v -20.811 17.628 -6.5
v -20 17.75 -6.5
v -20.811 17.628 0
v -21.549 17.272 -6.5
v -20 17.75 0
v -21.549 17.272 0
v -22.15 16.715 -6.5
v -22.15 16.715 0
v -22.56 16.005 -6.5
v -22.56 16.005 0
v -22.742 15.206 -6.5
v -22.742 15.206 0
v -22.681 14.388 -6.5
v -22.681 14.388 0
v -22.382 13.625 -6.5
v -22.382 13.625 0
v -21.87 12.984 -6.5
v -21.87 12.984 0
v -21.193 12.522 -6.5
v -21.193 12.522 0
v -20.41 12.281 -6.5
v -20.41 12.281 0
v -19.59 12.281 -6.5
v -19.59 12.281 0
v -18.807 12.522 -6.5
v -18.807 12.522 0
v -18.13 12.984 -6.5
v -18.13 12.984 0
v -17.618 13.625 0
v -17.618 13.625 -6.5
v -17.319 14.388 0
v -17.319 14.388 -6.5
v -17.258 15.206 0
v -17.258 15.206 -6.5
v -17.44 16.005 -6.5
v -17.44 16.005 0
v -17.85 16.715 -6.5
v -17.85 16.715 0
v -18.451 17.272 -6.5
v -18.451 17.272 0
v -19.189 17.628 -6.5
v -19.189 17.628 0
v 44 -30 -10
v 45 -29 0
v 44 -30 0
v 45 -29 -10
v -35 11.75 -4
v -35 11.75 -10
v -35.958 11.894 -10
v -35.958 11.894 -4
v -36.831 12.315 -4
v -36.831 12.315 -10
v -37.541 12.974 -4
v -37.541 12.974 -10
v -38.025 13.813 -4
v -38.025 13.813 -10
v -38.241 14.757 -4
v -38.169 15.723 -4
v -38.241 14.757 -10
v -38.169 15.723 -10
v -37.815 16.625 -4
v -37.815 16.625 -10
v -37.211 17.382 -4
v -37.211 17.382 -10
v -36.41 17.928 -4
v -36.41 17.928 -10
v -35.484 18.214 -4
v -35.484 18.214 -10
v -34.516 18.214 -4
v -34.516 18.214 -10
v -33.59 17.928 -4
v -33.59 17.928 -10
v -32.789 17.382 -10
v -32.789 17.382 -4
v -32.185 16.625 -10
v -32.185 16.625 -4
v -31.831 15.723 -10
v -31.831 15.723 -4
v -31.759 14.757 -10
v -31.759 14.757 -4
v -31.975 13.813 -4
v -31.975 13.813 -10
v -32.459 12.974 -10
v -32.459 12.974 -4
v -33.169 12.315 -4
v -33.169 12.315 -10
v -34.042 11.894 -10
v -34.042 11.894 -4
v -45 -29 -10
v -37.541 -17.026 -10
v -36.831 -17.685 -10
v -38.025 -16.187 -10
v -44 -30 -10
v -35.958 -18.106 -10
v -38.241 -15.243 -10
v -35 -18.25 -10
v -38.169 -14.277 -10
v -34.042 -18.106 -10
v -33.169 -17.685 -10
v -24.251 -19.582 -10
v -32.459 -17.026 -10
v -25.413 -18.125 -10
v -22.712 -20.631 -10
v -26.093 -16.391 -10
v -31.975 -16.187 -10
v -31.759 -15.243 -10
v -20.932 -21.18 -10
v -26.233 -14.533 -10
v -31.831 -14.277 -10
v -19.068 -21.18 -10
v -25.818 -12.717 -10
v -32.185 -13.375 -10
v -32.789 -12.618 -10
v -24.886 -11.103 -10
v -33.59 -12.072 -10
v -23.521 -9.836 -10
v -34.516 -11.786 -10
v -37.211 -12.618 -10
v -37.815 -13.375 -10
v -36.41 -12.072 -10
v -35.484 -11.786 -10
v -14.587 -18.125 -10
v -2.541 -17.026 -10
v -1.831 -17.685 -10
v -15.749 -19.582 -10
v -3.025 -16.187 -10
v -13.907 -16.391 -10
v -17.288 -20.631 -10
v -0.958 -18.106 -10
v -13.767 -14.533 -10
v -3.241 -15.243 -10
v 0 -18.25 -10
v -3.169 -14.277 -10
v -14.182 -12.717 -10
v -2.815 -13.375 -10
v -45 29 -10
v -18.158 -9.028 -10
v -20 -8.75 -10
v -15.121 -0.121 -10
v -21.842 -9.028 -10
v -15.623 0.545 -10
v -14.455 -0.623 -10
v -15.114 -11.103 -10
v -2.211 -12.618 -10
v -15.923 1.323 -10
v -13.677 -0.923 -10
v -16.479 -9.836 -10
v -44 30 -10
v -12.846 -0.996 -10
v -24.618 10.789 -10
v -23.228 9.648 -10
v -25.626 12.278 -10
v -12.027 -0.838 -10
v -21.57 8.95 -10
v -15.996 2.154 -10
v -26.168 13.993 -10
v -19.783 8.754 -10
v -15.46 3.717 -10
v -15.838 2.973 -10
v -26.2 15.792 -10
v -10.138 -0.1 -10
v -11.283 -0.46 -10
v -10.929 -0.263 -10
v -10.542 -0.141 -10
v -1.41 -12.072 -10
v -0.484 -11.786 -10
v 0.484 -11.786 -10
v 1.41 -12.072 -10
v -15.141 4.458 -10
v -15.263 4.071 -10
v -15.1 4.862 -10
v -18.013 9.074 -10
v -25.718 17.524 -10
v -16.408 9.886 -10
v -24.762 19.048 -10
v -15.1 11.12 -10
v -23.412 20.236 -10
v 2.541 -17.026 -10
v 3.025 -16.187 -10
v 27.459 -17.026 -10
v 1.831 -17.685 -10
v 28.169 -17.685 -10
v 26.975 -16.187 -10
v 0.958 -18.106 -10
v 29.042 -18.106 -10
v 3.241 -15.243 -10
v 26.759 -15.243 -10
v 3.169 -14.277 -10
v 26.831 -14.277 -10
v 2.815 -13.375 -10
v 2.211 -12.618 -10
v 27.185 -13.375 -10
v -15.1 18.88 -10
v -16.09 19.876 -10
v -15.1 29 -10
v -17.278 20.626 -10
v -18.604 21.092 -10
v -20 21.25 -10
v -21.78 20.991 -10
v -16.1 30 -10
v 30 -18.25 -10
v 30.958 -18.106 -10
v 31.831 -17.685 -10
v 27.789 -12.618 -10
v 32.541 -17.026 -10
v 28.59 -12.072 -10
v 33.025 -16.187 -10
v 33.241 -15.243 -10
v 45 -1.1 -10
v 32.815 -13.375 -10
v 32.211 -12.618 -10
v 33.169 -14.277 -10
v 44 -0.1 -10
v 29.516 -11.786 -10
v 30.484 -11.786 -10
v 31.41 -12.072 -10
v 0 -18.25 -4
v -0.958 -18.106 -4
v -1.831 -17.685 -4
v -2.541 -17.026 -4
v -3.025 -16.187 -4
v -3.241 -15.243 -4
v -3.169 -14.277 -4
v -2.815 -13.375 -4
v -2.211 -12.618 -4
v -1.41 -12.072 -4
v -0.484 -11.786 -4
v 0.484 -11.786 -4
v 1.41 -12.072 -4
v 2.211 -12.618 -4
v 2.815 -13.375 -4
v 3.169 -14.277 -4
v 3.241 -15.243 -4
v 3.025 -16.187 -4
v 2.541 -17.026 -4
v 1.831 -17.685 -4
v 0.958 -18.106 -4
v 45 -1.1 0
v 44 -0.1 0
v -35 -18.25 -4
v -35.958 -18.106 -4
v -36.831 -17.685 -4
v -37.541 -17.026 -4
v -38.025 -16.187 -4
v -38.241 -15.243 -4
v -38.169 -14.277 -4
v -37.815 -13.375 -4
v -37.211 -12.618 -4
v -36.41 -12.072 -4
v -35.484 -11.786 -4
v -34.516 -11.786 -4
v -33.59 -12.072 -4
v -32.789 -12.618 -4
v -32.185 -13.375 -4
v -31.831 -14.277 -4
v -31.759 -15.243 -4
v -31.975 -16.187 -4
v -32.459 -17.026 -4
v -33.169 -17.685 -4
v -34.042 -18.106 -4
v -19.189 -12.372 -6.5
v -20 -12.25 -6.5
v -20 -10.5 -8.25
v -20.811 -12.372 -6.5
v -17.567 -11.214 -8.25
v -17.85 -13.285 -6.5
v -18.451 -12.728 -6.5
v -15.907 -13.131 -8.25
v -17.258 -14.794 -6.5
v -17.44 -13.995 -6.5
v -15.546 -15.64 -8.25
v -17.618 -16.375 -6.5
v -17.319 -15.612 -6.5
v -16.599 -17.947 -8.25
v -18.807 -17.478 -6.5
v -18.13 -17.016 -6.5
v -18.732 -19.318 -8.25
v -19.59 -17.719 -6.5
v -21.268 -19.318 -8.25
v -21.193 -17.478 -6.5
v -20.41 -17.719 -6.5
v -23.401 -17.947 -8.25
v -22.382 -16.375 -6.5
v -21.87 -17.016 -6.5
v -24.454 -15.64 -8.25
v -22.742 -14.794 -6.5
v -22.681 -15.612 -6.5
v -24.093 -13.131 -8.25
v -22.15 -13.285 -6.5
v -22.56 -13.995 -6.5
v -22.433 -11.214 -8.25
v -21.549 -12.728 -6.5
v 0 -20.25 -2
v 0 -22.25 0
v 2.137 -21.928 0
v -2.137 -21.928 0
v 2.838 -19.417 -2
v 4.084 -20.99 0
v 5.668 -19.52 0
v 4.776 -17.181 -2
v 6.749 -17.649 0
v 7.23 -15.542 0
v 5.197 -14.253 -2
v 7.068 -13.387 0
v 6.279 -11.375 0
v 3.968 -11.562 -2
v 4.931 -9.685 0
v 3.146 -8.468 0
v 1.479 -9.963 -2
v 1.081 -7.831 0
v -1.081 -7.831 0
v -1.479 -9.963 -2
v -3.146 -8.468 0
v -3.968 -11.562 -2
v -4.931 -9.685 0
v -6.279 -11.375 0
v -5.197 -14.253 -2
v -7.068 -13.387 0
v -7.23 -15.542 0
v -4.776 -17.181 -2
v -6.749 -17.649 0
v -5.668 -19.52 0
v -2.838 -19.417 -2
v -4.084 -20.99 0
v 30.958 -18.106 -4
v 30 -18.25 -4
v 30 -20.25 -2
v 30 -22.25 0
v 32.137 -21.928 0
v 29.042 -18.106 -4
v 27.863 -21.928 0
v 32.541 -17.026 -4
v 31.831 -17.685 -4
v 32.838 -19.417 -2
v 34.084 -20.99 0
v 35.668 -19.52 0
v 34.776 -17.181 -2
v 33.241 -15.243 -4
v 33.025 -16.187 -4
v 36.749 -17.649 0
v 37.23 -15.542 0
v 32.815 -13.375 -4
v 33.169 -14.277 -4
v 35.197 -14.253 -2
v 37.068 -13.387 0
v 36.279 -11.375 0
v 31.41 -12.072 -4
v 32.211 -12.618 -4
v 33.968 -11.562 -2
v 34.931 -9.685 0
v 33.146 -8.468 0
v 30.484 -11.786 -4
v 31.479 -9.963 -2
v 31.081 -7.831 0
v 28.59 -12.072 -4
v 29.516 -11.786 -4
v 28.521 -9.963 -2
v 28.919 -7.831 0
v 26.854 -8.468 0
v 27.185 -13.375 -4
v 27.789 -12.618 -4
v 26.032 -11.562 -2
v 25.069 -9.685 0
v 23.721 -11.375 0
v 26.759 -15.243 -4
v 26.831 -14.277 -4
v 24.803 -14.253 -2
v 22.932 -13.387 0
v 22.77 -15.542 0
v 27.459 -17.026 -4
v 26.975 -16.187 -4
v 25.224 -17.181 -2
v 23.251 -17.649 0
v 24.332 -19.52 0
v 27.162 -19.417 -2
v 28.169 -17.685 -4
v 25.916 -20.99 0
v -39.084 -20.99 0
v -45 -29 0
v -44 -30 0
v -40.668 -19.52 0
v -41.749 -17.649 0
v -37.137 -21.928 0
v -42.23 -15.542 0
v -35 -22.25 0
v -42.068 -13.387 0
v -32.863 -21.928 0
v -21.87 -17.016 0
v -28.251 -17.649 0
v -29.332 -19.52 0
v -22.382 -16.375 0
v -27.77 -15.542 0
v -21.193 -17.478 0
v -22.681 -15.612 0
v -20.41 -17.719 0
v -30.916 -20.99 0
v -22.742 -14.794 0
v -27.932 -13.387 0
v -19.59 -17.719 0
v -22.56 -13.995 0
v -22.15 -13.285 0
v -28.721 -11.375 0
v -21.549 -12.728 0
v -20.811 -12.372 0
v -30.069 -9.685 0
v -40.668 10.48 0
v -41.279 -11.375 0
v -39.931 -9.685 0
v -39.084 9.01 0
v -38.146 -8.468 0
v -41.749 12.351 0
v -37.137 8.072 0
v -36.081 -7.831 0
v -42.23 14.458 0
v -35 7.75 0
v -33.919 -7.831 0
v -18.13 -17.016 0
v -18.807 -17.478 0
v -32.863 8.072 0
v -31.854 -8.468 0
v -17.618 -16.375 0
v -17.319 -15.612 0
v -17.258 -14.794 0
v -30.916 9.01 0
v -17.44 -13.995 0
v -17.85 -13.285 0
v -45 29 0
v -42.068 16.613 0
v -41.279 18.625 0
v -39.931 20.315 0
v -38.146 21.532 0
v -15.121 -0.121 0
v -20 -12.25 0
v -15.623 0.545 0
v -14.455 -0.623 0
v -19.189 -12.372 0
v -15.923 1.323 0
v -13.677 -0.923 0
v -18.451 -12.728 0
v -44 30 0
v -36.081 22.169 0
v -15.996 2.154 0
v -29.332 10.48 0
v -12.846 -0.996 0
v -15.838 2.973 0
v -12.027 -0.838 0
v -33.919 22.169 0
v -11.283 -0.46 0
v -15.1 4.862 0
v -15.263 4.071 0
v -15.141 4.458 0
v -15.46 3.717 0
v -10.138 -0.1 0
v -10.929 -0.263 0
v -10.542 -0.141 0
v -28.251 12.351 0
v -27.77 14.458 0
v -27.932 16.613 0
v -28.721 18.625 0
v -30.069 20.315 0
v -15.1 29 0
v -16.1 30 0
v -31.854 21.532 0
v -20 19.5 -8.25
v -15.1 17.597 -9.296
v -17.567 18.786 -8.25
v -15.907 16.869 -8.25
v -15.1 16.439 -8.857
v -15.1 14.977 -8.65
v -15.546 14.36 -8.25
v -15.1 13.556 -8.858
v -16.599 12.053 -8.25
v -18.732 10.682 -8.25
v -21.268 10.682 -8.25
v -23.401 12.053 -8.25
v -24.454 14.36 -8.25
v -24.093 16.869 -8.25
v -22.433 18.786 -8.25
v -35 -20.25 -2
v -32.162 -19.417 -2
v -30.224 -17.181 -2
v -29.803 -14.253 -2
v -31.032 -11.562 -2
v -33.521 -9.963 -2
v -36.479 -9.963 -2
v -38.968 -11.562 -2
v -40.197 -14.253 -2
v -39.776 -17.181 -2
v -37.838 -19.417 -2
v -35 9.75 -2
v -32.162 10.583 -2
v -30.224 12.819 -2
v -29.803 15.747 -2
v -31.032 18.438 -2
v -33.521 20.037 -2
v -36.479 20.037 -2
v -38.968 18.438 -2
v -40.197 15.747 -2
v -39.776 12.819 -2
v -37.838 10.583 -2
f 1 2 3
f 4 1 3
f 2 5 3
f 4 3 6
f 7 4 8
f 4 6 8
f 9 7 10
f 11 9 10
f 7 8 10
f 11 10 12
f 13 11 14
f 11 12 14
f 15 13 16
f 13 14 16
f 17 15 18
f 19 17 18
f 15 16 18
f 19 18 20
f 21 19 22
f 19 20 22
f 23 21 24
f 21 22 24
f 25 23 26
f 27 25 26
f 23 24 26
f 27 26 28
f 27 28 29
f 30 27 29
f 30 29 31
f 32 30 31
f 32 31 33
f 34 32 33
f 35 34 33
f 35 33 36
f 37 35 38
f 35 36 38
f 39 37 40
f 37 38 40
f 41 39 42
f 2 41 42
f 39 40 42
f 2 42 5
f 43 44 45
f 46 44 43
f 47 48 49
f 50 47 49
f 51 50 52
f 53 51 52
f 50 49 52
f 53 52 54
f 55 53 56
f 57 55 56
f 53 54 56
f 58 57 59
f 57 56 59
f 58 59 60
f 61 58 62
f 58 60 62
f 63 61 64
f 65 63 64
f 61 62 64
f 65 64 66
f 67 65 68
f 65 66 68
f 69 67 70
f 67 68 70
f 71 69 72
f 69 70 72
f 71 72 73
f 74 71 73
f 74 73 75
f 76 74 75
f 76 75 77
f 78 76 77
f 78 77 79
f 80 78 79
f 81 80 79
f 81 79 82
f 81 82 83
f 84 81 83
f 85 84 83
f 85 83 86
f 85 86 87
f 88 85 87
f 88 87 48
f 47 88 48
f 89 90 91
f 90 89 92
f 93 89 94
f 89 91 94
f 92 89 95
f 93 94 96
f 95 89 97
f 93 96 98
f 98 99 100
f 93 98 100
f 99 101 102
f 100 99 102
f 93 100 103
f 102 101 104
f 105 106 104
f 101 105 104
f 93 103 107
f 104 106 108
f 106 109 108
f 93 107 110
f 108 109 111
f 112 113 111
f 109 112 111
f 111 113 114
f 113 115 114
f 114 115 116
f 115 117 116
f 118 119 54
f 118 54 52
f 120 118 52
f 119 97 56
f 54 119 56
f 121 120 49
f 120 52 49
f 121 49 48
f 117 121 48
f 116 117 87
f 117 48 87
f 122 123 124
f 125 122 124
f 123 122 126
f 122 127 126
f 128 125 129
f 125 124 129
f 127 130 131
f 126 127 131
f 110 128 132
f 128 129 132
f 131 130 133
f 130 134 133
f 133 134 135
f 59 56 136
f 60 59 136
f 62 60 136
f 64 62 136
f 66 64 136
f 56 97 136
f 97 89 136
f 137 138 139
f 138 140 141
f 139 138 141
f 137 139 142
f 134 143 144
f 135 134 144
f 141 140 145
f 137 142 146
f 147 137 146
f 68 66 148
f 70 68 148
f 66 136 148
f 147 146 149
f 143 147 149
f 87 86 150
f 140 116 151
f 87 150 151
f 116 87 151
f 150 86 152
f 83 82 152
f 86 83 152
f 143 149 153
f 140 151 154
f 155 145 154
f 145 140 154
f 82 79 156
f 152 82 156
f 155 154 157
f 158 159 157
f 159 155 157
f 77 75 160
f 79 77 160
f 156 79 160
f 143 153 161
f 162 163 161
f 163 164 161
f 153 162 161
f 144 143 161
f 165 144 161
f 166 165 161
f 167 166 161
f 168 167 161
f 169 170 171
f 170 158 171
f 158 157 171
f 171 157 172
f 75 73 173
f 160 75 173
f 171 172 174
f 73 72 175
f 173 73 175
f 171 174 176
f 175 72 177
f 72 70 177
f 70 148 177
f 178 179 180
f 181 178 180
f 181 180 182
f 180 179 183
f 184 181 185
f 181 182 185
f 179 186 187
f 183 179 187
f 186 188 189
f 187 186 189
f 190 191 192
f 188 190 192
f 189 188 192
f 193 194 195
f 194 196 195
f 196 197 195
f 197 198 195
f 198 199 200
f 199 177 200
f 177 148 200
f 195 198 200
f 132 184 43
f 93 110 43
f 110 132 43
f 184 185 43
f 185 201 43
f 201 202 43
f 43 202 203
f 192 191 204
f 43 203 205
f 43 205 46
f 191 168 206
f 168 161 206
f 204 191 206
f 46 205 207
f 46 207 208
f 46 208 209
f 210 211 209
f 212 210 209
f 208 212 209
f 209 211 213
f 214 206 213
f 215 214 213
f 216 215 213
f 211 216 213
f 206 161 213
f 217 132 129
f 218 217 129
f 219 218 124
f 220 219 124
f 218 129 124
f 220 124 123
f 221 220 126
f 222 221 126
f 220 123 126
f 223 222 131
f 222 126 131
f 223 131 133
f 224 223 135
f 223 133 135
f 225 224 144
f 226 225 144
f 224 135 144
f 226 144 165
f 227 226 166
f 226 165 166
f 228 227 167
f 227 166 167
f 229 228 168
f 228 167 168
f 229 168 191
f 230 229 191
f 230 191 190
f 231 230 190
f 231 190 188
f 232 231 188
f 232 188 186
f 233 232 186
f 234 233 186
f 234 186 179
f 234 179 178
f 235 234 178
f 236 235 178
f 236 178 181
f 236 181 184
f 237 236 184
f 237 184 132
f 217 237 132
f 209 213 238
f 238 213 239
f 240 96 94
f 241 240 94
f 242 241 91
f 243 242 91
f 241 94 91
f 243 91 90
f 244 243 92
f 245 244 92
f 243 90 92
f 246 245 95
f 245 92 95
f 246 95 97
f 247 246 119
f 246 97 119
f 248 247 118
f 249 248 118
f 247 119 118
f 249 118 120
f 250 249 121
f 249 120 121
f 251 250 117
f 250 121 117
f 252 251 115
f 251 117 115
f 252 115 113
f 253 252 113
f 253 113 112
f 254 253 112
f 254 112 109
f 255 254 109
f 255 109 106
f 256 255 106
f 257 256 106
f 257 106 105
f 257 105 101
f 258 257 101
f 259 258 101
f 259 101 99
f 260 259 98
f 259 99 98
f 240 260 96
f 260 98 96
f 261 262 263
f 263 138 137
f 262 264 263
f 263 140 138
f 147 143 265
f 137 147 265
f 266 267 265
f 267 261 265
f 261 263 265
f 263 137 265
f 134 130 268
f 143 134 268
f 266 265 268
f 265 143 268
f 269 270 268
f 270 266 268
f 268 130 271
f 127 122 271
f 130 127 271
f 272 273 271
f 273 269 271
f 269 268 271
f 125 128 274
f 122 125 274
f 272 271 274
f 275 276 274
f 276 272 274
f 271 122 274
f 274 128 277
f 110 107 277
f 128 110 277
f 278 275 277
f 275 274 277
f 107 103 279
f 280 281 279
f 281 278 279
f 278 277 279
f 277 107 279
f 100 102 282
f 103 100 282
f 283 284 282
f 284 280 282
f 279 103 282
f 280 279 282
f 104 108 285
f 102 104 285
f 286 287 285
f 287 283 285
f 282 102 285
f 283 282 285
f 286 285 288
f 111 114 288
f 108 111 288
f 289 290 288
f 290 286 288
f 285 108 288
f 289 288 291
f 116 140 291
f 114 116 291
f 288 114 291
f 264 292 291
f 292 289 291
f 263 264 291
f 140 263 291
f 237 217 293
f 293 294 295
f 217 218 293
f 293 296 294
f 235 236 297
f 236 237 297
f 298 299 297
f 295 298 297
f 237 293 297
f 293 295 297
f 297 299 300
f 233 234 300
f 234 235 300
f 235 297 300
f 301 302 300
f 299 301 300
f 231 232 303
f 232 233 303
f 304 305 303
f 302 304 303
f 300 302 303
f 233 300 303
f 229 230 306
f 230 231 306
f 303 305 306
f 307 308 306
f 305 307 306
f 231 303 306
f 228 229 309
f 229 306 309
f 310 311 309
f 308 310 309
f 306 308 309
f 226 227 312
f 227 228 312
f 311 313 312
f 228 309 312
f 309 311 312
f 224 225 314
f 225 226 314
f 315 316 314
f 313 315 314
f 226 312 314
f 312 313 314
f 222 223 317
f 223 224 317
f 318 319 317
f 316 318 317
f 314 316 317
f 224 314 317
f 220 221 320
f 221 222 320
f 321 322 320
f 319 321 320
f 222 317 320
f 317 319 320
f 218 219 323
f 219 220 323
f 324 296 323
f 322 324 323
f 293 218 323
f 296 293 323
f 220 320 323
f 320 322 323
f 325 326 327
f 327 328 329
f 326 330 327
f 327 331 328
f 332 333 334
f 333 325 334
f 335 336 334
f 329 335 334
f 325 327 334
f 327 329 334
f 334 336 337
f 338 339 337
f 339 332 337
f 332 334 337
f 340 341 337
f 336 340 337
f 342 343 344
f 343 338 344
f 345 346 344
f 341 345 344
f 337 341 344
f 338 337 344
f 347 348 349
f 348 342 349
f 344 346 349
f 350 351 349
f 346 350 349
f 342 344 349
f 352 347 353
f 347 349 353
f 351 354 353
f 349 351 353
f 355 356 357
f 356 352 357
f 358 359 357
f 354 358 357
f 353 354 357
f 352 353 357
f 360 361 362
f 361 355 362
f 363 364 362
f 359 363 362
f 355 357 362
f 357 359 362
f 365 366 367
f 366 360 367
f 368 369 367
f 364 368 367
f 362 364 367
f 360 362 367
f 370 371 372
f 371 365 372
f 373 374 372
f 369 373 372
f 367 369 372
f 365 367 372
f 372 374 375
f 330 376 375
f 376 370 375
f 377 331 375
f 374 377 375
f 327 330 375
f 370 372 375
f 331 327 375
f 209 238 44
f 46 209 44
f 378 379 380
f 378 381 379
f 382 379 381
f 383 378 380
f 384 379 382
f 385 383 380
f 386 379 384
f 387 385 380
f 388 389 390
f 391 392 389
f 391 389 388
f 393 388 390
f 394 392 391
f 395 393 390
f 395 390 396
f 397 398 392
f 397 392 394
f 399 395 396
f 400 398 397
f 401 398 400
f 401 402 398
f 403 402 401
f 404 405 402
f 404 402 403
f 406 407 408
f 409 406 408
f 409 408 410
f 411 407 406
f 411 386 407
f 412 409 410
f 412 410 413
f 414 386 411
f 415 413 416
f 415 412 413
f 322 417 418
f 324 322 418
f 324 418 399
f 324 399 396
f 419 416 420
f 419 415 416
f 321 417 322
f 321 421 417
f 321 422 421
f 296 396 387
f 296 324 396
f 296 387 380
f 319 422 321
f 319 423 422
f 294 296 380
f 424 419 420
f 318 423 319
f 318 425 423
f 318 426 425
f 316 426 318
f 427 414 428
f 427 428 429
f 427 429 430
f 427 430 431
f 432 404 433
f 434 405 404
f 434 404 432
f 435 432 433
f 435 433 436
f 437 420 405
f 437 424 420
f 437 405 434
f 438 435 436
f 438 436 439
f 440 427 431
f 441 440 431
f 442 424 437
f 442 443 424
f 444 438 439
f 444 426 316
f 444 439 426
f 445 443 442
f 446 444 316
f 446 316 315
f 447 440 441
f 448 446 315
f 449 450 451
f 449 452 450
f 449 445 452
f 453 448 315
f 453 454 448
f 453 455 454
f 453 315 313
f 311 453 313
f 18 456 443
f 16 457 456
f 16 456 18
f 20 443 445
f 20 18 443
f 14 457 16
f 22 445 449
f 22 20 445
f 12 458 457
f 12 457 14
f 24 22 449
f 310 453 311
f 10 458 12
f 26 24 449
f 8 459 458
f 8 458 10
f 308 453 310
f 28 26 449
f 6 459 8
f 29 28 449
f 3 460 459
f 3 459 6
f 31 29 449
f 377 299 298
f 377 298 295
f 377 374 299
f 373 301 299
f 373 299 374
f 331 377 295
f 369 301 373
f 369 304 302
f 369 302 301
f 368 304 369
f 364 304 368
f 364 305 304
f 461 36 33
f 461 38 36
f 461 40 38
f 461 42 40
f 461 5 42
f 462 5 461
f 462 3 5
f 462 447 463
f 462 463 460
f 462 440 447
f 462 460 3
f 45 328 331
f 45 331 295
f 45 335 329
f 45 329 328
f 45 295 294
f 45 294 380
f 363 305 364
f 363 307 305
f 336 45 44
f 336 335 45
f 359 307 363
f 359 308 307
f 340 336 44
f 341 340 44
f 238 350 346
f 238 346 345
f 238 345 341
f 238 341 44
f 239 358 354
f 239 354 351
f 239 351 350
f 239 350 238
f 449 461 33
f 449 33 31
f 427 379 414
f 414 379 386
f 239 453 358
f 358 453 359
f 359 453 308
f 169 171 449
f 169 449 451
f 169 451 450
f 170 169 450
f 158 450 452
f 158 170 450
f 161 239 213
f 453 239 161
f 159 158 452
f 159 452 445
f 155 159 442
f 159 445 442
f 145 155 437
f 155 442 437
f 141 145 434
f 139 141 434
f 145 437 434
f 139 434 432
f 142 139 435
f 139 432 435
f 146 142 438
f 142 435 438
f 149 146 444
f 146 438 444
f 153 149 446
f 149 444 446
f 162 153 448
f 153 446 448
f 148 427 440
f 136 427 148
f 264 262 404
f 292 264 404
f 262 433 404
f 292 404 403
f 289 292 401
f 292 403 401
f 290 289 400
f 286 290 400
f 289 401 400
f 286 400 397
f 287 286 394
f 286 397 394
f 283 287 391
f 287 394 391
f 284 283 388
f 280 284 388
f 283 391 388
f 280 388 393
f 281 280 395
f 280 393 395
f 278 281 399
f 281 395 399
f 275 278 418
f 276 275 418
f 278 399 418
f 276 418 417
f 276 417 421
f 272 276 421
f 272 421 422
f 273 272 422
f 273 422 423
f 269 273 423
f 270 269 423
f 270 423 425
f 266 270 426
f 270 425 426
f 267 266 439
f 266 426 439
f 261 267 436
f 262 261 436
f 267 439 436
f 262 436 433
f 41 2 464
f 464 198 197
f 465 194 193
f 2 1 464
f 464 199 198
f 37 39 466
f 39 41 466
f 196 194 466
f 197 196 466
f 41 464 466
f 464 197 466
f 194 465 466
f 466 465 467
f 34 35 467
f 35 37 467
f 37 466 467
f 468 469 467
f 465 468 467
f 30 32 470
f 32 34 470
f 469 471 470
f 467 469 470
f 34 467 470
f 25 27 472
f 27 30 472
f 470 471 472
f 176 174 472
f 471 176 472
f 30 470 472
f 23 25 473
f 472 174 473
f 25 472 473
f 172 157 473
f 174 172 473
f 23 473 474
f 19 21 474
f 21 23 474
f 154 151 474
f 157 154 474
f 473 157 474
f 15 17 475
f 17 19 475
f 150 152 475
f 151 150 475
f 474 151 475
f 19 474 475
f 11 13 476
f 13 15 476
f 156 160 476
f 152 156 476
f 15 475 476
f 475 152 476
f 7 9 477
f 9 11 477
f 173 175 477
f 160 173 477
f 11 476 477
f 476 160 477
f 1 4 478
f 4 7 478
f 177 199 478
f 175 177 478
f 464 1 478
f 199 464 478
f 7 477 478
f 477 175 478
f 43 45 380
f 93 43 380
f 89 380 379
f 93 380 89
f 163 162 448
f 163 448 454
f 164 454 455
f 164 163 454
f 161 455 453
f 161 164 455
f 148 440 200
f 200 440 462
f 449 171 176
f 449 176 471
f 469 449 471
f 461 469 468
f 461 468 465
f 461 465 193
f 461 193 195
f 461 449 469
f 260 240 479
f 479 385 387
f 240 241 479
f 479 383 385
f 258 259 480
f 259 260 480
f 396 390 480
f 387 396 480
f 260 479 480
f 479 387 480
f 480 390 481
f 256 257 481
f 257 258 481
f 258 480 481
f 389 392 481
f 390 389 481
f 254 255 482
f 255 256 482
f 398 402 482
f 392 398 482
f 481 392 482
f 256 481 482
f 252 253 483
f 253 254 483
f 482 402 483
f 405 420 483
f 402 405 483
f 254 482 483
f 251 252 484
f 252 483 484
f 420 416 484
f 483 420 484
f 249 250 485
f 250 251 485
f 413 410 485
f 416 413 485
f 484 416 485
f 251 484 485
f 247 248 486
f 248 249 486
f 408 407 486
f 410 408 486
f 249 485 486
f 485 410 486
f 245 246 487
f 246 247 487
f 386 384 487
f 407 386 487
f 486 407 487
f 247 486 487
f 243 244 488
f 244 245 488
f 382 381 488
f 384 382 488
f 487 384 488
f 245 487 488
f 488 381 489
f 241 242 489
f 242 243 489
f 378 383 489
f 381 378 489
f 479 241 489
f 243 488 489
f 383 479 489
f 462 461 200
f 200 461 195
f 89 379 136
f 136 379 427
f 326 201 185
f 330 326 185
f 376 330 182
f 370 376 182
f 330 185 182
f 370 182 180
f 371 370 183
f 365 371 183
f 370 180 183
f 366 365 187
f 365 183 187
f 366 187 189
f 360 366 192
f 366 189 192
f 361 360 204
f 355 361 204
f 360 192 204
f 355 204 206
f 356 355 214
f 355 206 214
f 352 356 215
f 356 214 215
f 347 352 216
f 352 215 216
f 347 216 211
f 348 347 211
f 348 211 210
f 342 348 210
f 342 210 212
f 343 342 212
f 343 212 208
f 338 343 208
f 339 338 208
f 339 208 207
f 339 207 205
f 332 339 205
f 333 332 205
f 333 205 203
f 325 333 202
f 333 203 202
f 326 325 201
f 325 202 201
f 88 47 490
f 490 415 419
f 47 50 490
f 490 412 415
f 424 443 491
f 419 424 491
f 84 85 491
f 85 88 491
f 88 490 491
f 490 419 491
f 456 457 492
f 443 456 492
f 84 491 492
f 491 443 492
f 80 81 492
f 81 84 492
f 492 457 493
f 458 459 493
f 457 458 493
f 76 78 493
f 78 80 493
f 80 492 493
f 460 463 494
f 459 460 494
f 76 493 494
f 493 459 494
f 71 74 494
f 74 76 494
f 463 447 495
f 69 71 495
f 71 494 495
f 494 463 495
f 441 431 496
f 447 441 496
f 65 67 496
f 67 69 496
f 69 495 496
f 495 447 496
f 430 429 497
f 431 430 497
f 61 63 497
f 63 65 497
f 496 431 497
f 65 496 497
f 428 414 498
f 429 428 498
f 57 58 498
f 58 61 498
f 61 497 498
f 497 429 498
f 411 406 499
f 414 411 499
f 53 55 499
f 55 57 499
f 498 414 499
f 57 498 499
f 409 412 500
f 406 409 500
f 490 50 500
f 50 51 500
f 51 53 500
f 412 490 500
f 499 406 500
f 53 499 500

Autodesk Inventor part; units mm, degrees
ref_plane "YZ Plane" through (0, 0, 0) normal (1, 0, 0) x (0, 1, 0)
ref_plane "XZ Plane" through (0, 0, 0) normal (0, 1, 0) x (-1, 0, 0)
ref_plane "XY Plane" through (0, 0, 0) normal (0, 0, 1) x (1, 0, 0)
sketch "Esboço1" plane through (0, 0, 0) normal (0, 0, 1) x (1, 0, 0)
  line L0 (-63.02, 0) -> (63.12, 0) construction
  line L1 (0, -42.02) -> (0, 42.12) construction
  line L2 (-45, 30) -> (45, 30)
  line L3 (45, 30) -> (45, -30)
  line L4 (45, -30) -> (-45, -30)
  line L5 (-45, -30) -> (-45, 30)
  line L6 (-15, 30) -> (45, 30) construction
  line L7 (45, 30) -> (45, 0) construction
  line L8 (45, 0) -> (-15, 0) construction
  line L9 (-15, 0) -> (-15, 30) construction
  line L10 (-15.1, 30.1) -> (45.1, 30.1)
  line L11 (45.1, 30.1) -> (45.1, -0.1)
  line L12 (45.1, -0.1) -> (-15.1, -0.1)
  line L13 (-15.1, -0.1) -> (-15.1, 30.1)
  line L14 (-25, 30) -> (-15, 30) construction
  line L15 (-15, 30) -> (-15, -30) construction
  line L16 (-15, -30) -> (-25, -30) construction
  line L17 (-25, -30) -> (-25, 30) construction
  line L18 (-45, 15) -> (45, 15) construction
  line L19 (-45, -15) -> (45, -15) construction
  line L20 (-20, -30) -> (-20, 30) construction
  line L21 (-35, 30) -> (-35, -30) construction
  line L22 (15, 30) -> (15, -30) construction
  circle A0 centre (-13, 2) radius 3
  point P0 (0, 0)
  point P1 (-20, 15)
  point P2 (-20, -15)
  point P3 (0, -15)
  point P4 (30, -15)
  point P5 (-35, 15)
  point P6 (-35, -15)
  point P7 (45, -0.1)
  point P8 (-15.1, 30)
  point P9 (-10.8576, -0.1)
  point P10 (-15.1, 4.1424)
  dimension "d0" = 60
  dimension "d1" = 90
  dimension "d2" = 60
  dimension "d3" = 30
  dimension "d4" = 0.1
  dimension "d5" = 10
  dimension "d6" = 30
  dimension "d7" = 30
  dimension "d17" = 6
  dimension "d18" = 2
  dimension "d19" = 2
extrude "Extrusão1" add sketch "Esboço1" against normal blind 10 contours L2 L13 A0 L12 L3 L4 L5 | L2 L3 L12 A0 L13 | A0 L12 L13 | L13 L12 A0
extrude "Extrusão2" cut sketch "Esboço1" against normal through all contours L2 L3 L12 A0 L13 | A0 L12 L13 | L13 L12 A0
hole "Furo1" at (0, -15, 0) at (30, -15, 0) at (-35, 15, 0) at (-35, -15, 0) direction (0, 0, -1) diameter 6.5 end through all countersink diameter 14.5 countersink angle 90 clearance for "Countersunk Flat Head Hex Socket Screw ISO 10642" size "M6" standard "ISO"
sketch "Esboço2" plane through (0, 0, -10) normal (0, 0, -1) x (-1, 0, 0)
  point P0 (0, 0)
  point P1 (20, 15)
  point P2 (20, -15)
hole "Furo2" at (-20, 15, -10) at (-20, -15, -10) direction (0, 0, 1) diameter 5.5 end through all countersink diameter 12.5 countersink angle 90 clearance for "Countersunk Flat Head Hex Socket Screw ISO 10642" size "M5" standard "ISO"
chamfer "Chanfro1" distance 1 angle 45 5 edges at (-45, 30, -5) (-15.1, 30, -5) (-45, -30, -5) (45, -30, -5) (45, -0.1, -5)
fillet "Arredondamento1" radius 2 2 edges at (-15.1, 4.1424, -5) (-10.8576, -0.1, -5)
equation "\"d18\" = 0.333333 * d17"
equation "\"d19\" = d18"
properties part number "Chapa Suporte 1L (Trilho Roletado)" material "Aluminio 1060"
